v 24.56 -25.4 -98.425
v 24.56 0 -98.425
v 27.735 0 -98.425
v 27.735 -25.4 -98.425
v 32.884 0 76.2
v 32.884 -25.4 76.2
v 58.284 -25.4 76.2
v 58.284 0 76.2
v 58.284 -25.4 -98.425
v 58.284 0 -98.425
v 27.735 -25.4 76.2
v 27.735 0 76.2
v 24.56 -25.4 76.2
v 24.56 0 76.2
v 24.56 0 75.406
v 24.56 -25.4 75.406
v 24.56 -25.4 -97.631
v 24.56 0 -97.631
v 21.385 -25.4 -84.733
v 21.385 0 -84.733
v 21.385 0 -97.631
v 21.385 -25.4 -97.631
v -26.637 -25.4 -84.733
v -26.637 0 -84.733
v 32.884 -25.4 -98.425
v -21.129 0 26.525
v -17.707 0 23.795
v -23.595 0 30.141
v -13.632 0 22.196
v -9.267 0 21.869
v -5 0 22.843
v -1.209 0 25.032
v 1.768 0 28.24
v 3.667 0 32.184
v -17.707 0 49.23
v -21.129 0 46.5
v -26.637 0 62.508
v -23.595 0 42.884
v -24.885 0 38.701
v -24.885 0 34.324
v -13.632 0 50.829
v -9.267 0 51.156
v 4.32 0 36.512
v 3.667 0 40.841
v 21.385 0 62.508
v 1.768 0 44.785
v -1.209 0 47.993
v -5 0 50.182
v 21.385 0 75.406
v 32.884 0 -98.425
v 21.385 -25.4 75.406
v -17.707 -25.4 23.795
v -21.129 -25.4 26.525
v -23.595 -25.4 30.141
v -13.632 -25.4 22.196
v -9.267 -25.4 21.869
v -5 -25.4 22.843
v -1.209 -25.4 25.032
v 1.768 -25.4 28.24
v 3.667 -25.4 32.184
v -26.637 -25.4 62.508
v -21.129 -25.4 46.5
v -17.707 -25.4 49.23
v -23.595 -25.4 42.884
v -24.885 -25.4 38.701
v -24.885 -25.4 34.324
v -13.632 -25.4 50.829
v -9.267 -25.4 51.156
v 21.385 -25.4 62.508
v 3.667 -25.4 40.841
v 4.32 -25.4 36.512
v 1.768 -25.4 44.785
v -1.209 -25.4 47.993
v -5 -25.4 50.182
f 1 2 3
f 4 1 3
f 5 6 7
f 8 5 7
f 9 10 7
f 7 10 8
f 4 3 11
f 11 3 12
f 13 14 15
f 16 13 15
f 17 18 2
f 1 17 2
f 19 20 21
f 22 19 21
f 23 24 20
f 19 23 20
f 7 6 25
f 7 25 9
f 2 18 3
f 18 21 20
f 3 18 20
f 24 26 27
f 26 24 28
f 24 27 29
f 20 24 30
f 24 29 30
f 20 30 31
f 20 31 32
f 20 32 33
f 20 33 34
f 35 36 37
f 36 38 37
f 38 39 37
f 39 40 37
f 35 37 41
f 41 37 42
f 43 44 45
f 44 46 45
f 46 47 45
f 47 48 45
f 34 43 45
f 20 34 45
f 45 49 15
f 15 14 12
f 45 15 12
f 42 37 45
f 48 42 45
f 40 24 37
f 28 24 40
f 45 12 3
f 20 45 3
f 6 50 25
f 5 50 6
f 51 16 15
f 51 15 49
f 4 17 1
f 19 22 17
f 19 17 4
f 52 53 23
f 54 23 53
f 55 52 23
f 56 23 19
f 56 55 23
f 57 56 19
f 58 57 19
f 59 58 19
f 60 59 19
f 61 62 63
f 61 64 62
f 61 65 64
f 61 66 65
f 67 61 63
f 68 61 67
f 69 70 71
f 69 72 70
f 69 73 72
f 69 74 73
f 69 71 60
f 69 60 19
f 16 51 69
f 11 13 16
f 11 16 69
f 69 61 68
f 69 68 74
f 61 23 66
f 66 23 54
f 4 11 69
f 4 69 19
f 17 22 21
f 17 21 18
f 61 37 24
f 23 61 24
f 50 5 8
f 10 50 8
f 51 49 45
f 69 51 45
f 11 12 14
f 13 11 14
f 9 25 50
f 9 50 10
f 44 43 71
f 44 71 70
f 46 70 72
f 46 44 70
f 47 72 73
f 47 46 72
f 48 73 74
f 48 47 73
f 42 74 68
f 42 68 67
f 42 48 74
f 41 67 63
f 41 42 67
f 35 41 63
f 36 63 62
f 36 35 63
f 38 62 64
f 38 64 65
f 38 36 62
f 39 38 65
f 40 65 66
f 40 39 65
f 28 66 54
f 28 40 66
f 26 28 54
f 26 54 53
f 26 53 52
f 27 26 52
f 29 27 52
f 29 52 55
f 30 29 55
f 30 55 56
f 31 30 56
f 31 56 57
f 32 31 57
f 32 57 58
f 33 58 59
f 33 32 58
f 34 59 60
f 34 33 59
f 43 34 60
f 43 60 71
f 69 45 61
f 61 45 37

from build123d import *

# Parameters (mm, degrees)
F0_R     = 14.684375
F0_W     = 25.4
F0_H     = 174.625
F1_DEPTH = 25.4


with BuildPart() as f1:
    # F0 (on Front) → F1 (new body)
    with BuildSketch(Plane.XZ):
        Polygon((21.38521, 62.507813), (-26.636665, 62.507813), (-26.636665, -84.732813), (21.38521, -84.732812), (21.38521, -97.63125), (24.56021, -97.63125), (24.56021, -98.425), (27.73521, -98.425), (27.73521, 76.2), (24.56021, 76.2), (24.56021, 75.40625), (21.38521, 75.40625), align=None)
        with Locations((-10.36479, 36.5125)):
            Circle(F0_R, mode=Mode.SUBTRACT)
        with Locations((45.583543, -11.1125)):
            Rectangle(F0_W, F0_H)
    extrude(amount=F1_DEPTH)


solid = f1.part
